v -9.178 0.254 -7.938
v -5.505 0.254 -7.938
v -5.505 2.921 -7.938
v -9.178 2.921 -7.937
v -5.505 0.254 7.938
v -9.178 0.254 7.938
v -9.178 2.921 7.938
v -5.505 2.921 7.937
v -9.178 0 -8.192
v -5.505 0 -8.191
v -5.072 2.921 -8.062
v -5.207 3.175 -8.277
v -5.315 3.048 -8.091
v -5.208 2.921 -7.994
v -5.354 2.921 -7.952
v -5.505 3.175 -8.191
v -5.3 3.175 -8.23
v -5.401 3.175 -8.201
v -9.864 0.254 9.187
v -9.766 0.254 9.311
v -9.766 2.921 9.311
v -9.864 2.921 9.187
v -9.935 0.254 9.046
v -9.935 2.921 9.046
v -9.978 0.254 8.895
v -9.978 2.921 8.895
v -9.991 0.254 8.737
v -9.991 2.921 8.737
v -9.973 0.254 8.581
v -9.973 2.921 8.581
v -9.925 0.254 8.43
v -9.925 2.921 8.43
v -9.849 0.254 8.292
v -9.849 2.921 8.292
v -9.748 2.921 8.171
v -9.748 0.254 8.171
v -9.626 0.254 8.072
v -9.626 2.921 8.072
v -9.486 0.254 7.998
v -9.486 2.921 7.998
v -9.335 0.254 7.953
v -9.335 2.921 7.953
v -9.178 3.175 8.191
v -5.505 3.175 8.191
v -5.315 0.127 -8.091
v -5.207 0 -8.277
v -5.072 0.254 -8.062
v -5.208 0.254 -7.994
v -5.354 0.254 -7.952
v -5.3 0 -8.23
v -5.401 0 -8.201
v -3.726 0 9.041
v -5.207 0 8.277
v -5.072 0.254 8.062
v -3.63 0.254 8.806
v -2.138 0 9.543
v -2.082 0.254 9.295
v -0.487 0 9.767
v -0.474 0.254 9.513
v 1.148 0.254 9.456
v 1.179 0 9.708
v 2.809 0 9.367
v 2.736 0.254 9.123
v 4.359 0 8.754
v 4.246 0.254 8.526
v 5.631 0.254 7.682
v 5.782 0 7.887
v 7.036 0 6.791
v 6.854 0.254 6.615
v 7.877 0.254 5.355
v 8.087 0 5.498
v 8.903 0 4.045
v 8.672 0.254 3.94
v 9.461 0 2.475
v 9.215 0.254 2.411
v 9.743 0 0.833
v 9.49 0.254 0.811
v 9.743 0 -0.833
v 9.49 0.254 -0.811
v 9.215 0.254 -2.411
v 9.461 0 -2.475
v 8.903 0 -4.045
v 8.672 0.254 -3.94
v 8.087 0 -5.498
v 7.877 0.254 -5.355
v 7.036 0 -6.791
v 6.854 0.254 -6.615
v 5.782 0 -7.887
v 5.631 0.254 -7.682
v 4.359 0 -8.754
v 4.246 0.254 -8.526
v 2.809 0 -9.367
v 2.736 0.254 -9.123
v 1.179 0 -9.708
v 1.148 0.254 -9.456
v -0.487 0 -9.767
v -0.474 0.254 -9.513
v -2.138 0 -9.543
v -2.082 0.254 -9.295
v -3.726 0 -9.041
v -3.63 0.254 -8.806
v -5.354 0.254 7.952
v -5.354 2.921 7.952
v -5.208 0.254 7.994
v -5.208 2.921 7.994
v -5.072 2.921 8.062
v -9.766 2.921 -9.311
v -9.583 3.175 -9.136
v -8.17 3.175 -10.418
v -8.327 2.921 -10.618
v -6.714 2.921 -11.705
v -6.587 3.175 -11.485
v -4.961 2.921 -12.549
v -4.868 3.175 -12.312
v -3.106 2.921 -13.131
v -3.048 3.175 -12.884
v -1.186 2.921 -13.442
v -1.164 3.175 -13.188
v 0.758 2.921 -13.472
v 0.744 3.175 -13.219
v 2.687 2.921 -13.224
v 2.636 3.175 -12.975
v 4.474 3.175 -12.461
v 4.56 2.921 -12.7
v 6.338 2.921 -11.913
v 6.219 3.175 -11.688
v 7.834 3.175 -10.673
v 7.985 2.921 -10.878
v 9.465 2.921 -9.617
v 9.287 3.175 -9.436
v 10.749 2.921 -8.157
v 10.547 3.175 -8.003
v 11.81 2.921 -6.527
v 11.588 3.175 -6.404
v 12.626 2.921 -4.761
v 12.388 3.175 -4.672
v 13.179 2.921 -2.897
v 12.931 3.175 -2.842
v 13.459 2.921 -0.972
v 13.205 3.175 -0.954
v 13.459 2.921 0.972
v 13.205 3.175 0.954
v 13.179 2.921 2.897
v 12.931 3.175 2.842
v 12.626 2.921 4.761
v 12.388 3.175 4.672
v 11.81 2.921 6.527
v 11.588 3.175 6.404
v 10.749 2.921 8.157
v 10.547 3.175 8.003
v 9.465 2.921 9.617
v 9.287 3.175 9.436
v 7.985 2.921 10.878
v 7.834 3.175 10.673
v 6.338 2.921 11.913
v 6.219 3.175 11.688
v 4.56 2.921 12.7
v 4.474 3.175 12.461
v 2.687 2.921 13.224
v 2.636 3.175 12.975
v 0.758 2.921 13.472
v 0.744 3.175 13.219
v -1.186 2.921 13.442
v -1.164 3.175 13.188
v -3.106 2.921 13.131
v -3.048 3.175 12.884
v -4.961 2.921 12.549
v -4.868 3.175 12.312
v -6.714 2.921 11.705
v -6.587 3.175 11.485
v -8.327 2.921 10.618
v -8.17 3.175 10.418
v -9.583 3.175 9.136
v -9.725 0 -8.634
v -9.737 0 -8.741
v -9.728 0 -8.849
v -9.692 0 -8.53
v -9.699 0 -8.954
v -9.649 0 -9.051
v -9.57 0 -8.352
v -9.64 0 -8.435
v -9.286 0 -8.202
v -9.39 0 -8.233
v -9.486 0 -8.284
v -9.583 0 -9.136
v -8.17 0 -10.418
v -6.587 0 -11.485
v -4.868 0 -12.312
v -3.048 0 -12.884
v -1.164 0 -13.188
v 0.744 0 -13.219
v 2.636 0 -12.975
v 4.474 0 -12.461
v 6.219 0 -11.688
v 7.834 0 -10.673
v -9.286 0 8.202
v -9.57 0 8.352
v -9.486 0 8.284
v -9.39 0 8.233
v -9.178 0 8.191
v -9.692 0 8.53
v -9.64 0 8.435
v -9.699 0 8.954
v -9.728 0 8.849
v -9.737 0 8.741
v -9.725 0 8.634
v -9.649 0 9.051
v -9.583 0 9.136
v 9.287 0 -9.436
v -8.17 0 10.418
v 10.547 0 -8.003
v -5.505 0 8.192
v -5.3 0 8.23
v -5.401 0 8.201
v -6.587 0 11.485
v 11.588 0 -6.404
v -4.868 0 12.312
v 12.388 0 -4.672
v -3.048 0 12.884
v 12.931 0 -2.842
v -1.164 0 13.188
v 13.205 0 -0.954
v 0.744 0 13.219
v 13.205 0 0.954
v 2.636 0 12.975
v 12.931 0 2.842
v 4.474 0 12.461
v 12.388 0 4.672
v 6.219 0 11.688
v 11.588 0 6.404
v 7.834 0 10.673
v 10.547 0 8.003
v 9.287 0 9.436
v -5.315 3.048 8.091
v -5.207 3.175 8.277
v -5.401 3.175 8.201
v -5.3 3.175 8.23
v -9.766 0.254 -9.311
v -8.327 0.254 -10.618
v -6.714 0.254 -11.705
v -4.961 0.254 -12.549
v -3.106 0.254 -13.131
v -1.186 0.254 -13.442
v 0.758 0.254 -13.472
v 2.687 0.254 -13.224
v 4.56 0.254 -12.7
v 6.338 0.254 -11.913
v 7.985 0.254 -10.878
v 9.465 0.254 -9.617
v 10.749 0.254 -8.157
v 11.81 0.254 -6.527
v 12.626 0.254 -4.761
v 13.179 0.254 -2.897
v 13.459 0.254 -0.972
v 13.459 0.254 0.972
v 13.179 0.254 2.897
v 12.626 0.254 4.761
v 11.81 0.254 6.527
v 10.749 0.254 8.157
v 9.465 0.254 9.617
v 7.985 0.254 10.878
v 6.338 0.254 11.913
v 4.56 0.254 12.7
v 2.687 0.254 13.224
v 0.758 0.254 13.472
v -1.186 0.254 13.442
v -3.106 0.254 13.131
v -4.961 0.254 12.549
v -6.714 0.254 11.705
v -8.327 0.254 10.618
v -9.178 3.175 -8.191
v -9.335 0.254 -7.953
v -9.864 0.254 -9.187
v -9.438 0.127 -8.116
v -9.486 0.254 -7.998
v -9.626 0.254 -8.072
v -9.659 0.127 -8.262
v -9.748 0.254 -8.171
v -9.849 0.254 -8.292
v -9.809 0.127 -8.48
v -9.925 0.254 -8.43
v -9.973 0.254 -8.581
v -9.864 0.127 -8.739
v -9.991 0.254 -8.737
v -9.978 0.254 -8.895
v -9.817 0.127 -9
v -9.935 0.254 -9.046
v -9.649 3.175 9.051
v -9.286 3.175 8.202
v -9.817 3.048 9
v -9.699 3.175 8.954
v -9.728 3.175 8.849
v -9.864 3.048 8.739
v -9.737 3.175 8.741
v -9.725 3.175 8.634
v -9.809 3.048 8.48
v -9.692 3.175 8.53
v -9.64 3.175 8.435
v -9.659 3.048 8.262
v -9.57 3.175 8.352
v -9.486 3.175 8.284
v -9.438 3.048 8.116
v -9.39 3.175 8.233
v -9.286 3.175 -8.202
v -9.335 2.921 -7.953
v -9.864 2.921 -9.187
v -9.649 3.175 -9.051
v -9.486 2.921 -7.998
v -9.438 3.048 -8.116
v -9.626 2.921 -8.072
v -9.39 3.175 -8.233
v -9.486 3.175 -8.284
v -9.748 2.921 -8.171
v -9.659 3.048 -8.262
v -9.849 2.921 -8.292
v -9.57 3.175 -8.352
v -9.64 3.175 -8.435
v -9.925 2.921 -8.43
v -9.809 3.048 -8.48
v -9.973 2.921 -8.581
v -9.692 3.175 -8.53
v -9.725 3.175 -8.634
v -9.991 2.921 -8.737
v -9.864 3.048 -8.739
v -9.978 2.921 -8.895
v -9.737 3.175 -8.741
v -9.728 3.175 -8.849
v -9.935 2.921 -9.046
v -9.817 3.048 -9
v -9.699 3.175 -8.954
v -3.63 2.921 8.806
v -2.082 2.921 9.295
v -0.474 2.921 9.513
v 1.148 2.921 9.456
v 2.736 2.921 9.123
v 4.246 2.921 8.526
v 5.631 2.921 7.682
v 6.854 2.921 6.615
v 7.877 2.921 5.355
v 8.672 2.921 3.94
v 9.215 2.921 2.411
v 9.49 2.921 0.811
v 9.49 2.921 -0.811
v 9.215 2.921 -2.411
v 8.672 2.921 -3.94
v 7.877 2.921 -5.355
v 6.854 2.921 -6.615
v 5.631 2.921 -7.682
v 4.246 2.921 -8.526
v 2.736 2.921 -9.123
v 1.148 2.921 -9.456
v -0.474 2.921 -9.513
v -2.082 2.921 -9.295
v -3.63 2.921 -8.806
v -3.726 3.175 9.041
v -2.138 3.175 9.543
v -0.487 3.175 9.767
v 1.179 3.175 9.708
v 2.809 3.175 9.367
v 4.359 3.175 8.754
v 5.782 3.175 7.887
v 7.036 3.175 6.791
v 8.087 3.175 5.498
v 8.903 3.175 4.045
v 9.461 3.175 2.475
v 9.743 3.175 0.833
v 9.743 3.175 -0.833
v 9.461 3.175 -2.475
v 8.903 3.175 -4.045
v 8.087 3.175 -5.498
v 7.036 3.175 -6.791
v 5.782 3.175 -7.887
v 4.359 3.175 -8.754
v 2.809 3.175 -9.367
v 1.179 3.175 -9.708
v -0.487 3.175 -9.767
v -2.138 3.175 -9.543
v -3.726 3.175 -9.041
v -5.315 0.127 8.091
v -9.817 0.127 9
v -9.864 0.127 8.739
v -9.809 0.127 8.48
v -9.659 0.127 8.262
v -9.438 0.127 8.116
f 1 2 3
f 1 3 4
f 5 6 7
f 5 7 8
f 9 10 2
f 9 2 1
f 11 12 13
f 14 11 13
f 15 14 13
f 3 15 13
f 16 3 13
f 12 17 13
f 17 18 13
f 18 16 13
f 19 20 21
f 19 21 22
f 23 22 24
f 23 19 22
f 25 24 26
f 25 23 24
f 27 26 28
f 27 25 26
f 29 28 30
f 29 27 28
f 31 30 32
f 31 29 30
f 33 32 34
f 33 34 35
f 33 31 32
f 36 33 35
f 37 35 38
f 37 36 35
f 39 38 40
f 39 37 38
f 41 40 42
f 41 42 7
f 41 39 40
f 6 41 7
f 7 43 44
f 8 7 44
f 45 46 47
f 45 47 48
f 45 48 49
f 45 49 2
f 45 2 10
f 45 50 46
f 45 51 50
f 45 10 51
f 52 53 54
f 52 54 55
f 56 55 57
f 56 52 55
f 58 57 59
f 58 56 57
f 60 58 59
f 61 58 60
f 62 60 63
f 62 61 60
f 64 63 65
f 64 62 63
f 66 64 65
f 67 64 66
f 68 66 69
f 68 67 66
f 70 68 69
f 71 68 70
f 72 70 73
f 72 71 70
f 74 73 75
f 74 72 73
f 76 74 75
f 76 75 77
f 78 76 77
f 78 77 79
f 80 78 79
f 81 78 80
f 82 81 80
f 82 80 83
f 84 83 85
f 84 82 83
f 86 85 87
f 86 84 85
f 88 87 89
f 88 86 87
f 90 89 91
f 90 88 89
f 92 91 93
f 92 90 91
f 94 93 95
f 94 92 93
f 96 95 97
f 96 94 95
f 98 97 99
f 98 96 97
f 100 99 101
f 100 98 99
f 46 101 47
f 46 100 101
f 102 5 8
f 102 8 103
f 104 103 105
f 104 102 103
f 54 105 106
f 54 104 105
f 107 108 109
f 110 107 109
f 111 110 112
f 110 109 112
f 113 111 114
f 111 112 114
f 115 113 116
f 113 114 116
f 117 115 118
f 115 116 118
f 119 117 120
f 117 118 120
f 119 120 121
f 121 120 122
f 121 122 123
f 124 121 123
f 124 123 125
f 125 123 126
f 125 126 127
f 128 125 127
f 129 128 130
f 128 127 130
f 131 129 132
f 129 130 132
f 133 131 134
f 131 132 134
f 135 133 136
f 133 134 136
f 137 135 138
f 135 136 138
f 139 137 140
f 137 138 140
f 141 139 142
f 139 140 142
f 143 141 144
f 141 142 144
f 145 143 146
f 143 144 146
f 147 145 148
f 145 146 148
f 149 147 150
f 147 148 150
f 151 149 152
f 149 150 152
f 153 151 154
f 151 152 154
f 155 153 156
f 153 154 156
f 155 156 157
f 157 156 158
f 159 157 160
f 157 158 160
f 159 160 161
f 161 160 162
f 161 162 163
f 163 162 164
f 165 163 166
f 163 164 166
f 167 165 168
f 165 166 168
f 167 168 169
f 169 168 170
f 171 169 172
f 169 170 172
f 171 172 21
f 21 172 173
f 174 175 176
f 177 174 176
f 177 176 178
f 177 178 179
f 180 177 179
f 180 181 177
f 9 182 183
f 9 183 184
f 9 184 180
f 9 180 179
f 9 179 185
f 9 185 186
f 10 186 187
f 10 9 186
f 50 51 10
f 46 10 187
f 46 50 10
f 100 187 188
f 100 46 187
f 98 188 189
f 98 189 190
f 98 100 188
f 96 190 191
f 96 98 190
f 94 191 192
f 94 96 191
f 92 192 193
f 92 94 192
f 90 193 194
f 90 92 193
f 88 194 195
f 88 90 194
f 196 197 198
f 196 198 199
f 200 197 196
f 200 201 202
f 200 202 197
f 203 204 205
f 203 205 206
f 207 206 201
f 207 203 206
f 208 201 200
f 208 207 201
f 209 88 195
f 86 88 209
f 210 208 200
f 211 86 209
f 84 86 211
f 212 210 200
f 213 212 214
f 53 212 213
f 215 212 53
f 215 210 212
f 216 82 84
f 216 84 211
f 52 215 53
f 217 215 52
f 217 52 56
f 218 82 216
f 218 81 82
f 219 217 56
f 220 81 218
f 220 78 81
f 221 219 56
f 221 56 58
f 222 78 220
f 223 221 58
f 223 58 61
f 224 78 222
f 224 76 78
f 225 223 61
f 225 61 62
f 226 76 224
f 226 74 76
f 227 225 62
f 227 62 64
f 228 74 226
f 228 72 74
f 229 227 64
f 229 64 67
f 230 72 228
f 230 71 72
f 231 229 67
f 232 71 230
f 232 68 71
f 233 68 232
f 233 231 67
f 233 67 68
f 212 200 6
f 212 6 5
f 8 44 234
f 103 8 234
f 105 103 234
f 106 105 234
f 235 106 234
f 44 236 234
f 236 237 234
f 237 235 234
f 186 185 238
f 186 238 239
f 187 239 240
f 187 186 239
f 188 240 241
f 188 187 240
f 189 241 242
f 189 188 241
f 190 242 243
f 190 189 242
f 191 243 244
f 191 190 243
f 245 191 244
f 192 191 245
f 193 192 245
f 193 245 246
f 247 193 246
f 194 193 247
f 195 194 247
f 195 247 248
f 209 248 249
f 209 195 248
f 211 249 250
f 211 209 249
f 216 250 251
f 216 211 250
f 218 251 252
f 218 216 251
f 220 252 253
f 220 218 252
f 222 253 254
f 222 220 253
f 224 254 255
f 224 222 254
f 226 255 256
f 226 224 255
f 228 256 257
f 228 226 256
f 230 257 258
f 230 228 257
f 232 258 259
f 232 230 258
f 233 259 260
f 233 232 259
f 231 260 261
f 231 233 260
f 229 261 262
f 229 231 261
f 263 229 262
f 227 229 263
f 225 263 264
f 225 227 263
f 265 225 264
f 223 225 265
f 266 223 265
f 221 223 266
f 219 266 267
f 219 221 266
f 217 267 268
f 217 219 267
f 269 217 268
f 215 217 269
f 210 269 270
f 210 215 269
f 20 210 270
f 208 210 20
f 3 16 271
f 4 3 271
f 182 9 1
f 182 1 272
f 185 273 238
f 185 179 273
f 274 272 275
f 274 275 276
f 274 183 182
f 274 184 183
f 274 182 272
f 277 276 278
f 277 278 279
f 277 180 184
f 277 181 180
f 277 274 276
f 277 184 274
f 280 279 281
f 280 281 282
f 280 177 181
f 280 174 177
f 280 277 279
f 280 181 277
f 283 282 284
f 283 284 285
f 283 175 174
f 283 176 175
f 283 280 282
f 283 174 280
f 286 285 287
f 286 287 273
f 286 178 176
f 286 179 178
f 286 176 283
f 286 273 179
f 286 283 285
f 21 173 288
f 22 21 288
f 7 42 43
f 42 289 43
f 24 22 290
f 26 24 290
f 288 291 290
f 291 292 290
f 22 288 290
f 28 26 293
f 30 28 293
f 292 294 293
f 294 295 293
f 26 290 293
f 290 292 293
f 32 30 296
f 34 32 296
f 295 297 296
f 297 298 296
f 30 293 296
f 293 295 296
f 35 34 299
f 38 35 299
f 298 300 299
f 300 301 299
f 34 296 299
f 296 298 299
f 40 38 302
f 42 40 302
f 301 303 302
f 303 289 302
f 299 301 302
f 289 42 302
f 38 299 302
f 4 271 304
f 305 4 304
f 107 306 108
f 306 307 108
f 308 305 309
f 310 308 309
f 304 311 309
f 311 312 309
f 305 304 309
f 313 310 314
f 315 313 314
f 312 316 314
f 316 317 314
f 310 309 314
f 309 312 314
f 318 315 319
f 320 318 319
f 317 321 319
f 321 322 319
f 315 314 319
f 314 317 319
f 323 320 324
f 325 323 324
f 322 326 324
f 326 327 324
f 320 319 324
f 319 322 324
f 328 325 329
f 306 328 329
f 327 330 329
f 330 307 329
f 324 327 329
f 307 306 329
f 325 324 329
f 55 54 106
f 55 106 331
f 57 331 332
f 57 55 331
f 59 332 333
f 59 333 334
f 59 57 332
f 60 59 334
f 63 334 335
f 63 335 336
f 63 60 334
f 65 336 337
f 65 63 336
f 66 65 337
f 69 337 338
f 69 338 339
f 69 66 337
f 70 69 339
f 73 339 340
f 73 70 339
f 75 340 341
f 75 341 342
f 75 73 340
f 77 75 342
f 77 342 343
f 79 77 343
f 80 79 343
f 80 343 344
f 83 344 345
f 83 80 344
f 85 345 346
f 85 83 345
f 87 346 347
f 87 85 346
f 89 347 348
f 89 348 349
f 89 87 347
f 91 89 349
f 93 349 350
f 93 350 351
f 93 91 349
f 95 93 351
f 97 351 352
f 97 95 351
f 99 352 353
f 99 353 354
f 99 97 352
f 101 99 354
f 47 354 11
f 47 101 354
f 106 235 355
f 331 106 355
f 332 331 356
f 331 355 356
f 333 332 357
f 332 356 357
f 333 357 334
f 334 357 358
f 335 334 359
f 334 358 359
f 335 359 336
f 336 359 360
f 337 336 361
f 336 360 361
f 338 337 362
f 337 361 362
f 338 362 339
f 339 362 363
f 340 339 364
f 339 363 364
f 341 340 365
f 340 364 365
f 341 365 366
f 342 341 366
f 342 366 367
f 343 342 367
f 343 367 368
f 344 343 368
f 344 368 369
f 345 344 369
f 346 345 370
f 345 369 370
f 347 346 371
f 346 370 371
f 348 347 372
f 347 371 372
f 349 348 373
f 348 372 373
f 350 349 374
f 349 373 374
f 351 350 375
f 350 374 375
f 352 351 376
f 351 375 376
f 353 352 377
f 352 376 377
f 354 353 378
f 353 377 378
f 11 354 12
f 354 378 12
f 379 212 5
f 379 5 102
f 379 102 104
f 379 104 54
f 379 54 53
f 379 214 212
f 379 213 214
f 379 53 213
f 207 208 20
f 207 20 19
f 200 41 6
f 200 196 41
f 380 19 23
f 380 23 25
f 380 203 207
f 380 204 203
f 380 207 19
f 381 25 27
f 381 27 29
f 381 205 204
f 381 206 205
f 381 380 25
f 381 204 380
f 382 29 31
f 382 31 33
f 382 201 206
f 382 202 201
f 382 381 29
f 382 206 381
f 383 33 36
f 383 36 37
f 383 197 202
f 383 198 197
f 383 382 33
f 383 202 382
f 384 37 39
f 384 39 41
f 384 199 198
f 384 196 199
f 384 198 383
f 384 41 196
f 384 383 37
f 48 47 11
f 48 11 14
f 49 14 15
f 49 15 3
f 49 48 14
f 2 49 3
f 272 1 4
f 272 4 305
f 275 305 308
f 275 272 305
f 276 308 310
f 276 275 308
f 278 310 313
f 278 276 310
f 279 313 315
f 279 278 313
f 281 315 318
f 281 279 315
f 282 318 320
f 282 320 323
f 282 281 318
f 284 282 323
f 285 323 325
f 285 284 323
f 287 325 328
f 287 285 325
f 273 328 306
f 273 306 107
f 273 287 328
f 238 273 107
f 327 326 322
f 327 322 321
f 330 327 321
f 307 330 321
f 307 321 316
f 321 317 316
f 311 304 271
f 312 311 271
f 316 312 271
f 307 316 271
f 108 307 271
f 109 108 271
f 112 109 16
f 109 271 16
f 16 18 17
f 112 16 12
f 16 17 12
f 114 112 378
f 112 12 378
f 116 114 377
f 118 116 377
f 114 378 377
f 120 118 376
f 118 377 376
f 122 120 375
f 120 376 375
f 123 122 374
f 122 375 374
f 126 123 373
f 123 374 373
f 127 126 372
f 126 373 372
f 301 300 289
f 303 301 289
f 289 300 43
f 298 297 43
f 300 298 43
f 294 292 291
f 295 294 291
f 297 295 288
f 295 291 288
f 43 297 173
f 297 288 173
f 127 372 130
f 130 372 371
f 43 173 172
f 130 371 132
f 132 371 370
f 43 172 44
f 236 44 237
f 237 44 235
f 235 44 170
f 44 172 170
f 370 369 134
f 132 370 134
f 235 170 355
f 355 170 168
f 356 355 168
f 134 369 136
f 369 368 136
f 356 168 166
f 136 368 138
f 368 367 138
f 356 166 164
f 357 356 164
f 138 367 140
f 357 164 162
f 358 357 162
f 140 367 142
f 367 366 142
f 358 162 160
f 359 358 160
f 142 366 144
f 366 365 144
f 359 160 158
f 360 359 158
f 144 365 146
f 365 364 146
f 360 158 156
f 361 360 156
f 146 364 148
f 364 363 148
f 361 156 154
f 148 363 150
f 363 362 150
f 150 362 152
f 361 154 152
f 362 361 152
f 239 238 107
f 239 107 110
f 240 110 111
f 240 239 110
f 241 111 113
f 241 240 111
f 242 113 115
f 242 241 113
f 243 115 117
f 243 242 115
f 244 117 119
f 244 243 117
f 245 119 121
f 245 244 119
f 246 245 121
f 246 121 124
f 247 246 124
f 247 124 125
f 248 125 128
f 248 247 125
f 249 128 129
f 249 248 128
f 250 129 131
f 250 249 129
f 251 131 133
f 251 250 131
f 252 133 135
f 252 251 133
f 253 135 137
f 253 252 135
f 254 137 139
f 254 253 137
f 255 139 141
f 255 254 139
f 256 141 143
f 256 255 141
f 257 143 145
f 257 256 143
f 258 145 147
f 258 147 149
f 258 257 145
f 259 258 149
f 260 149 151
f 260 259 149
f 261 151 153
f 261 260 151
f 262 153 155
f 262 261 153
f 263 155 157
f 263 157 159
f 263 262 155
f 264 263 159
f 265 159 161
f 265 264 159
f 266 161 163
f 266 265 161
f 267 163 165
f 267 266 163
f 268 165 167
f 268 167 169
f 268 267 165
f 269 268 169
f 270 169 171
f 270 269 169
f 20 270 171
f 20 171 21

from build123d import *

# Parameters (mm, degrees)
F1_DEPTH = 3.175
F2_SIZE  = 0.254


with BuildPart() as f1:
    # F0 (on Front) → F1 (new body)
    with BuildSketch(Plane.XZ):
        with BuildLine():
            ThreePointArc((-9.178167, -7.9375), (-9.925332, -8.430318), (-9.766452, -9.31116))
            ThreePointArc((-9.766452, -9.31116), (13.49375, 0), (-9.766452, 9.31116))
            ThreePointArc((-9.766452, 9.31116), (-9.925332, 8.430318), (-9.178167, 7.9375))
            Line((-9.178167, 7.9375), (-5.504758, 7.9375))
            ThreePointArc((-5.504758, 7.9375), (-5.279535, 7.969327), (-5.071951, 8.062316))
            ThreePointArc((-5.071951, 8.062316), (9.525, 0), (-5.071951, -8.062316))
            ThreePointArc((-5.071951, -8.062316), (-5.279535, -7.969327), (-5.504758, -7.9375))
            Line((-5.504758, -7.9375), (-9.178167, -7.9375))
        make_face()
    extrude(amount=-F1_DEPTH)

    # F2
    f2_edges = [f1.edges().sort_by_distance(p)[0] for p in [
        (13.49375, 0, 0),
        (13.49375, 3.175, 0),
    ]]
    chamfer(f2_edges, length=F2_SIZE)


solid = f1.part
